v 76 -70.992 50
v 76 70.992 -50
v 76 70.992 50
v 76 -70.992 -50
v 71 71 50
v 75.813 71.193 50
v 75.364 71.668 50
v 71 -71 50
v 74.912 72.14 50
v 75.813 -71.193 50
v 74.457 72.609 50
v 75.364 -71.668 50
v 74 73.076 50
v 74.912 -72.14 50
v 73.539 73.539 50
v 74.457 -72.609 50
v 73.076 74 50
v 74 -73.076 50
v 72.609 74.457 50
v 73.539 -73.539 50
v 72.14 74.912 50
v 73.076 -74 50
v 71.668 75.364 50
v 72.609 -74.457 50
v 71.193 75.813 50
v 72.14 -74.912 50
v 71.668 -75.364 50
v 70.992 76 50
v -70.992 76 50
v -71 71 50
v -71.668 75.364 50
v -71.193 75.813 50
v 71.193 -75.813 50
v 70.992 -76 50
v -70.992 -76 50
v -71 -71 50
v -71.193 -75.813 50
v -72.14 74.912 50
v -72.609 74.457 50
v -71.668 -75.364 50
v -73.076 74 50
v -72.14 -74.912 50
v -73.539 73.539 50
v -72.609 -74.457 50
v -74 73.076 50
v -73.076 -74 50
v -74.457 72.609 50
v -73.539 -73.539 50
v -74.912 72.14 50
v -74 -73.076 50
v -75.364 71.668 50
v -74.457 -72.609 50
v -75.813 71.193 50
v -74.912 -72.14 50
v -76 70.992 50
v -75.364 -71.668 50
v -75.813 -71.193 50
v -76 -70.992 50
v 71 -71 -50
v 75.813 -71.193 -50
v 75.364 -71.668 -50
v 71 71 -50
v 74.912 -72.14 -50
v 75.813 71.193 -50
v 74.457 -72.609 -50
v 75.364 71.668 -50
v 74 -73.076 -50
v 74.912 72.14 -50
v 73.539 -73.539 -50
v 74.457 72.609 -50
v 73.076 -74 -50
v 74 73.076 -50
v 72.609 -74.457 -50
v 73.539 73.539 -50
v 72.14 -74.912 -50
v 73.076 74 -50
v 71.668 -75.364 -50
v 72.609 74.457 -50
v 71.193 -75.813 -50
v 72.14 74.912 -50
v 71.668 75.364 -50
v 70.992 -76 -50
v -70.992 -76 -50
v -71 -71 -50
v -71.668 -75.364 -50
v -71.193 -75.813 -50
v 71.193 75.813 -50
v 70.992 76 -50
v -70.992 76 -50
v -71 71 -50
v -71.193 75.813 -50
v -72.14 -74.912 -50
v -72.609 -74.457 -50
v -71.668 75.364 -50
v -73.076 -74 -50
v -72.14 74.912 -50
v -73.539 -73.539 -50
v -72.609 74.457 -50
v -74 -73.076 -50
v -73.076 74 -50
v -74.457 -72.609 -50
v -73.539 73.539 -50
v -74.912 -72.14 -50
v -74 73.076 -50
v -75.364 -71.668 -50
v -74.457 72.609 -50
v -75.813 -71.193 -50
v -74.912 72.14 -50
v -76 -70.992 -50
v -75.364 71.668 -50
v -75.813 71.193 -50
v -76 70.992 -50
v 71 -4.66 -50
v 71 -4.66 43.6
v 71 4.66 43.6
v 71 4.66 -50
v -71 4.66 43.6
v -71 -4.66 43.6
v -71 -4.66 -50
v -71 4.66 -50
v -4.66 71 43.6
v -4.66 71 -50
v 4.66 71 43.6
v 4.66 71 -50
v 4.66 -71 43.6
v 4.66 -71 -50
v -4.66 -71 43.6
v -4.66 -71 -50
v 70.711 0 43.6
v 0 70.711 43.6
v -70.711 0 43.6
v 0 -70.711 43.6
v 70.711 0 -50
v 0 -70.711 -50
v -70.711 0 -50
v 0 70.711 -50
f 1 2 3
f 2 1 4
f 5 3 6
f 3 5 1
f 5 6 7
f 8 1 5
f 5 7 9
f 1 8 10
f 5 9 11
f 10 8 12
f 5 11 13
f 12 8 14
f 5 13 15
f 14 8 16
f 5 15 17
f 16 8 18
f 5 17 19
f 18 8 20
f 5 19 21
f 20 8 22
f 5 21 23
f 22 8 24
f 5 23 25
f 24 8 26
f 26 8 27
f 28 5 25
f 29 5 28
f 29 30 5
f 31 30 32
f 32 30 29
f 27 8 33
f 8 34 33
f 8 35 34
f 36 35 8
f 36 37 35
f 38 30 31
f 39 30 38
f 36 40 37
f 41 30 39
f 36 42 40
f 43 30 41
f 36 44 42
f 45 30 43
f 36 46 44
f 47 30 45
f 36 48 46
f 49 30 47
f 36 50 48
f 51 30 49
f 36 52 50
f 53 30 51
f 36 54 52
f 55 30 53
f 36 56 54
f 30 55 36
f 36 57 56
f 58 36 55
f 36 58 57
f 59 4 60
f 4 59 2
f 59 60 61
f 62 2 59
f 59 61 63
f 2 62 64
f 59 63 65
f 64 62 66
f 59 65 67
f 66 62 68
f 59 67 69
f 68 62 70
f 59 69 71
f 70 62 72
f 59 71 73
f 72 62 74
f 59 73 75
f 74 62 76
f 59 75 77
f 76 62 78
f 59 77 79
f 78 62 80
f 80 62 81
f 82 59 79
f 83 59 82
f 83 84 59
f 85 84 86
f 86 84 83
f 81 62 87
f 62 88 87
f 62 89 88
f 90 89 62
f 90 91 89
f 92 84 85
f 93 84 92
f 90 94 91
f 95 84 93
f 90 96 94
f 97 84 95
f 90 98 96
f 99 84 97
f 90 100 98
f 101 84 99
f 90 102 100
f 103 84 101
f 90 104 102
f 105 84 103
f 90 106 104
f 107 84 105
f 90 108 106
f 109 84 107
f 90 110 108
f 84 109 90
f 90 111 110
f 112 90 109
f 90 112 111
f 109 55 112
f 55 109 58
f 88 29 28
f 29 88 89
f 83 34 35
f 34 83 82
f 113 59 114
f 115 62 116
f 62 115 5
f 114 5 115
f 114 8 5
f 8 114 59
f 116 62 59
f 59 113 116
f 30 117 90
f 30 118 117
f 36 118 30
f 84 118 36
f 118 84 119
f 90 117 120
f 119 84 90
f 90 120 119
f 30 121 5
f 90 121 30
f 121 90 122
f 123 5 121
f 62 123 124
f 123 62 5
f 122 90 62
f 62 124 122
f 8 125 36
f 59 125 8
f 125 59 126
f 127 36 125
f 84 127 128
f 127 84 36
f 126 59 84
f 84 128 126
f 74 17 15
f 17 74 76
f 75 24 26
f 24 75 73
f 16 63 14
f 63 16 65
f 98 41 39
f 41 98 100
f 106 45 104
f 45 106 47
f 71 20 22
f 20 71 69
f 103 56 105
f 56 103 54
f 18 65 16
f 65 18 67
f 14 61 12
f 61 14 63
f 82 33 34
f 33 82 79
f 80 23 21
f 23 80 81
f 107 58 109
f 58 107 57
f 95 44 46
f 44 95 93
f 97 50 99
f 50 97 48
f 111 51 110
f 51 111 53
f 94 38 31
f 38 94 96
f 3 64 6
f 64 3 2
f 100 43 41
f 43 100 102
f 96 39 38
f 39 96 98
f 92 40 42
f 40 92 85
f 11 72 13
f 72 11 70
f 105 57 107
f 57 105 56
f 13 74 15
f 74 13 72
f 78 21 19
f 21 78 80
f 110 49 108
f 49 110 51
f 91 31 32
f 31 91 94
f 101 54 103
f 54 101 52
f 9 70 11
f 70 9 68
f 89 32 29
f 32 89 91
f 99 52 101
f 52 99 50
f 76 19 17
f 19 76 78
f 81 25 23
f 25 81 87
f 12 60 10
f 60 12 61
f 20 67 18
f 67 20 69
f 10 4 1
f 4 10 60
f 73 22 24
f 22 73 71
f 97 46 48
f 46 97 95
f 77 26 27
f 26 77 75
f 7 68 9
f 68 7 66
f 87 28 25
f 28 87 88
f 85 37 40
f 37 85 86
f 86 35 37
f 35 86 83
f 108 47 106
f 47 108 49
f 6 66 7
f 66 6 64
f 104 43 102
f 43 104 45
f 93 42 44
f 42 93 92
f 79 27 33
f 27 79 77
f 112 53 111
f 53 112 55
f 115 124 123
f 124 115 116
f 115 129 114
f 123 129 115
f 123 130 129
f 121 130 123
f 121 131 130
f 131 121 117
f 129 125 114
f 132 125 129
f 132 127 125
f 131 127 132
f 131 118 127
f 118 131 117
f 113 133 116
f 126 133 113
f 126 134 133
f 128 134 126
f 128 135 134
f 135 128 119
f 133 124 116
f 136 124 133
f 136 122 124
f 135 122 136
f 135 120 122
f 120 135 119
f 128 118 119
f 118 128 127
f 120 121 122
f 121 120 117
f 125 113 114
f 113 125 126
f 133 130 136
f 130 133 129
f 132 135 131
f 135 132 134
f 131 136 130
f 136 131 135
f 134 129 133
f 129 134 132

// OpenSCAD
// this boot further increases the height of the plus maze so that it can be placed in the openfield and not worry about the open arm is close to the wall of the open field.

$fn=1000;

module hollow(w1, w2,h){
	difference(){
		cube([w1, w1, h], center=true);
		cube([w2, w2, h], center=true);
	}

}


difference(){
	hollow(152,142,100);
	translate([0,0,50]) cube([142, 142, 20], center=true);
	difference(){
		cylinder (r=110, h=100, center=true);
		cylinder(r=104, h=100,center=true, $fs=0.2);
	}
}
translate([0,0,-3.2]) rotate([0,0,45]) hollow(107,100,100-6.4); 
